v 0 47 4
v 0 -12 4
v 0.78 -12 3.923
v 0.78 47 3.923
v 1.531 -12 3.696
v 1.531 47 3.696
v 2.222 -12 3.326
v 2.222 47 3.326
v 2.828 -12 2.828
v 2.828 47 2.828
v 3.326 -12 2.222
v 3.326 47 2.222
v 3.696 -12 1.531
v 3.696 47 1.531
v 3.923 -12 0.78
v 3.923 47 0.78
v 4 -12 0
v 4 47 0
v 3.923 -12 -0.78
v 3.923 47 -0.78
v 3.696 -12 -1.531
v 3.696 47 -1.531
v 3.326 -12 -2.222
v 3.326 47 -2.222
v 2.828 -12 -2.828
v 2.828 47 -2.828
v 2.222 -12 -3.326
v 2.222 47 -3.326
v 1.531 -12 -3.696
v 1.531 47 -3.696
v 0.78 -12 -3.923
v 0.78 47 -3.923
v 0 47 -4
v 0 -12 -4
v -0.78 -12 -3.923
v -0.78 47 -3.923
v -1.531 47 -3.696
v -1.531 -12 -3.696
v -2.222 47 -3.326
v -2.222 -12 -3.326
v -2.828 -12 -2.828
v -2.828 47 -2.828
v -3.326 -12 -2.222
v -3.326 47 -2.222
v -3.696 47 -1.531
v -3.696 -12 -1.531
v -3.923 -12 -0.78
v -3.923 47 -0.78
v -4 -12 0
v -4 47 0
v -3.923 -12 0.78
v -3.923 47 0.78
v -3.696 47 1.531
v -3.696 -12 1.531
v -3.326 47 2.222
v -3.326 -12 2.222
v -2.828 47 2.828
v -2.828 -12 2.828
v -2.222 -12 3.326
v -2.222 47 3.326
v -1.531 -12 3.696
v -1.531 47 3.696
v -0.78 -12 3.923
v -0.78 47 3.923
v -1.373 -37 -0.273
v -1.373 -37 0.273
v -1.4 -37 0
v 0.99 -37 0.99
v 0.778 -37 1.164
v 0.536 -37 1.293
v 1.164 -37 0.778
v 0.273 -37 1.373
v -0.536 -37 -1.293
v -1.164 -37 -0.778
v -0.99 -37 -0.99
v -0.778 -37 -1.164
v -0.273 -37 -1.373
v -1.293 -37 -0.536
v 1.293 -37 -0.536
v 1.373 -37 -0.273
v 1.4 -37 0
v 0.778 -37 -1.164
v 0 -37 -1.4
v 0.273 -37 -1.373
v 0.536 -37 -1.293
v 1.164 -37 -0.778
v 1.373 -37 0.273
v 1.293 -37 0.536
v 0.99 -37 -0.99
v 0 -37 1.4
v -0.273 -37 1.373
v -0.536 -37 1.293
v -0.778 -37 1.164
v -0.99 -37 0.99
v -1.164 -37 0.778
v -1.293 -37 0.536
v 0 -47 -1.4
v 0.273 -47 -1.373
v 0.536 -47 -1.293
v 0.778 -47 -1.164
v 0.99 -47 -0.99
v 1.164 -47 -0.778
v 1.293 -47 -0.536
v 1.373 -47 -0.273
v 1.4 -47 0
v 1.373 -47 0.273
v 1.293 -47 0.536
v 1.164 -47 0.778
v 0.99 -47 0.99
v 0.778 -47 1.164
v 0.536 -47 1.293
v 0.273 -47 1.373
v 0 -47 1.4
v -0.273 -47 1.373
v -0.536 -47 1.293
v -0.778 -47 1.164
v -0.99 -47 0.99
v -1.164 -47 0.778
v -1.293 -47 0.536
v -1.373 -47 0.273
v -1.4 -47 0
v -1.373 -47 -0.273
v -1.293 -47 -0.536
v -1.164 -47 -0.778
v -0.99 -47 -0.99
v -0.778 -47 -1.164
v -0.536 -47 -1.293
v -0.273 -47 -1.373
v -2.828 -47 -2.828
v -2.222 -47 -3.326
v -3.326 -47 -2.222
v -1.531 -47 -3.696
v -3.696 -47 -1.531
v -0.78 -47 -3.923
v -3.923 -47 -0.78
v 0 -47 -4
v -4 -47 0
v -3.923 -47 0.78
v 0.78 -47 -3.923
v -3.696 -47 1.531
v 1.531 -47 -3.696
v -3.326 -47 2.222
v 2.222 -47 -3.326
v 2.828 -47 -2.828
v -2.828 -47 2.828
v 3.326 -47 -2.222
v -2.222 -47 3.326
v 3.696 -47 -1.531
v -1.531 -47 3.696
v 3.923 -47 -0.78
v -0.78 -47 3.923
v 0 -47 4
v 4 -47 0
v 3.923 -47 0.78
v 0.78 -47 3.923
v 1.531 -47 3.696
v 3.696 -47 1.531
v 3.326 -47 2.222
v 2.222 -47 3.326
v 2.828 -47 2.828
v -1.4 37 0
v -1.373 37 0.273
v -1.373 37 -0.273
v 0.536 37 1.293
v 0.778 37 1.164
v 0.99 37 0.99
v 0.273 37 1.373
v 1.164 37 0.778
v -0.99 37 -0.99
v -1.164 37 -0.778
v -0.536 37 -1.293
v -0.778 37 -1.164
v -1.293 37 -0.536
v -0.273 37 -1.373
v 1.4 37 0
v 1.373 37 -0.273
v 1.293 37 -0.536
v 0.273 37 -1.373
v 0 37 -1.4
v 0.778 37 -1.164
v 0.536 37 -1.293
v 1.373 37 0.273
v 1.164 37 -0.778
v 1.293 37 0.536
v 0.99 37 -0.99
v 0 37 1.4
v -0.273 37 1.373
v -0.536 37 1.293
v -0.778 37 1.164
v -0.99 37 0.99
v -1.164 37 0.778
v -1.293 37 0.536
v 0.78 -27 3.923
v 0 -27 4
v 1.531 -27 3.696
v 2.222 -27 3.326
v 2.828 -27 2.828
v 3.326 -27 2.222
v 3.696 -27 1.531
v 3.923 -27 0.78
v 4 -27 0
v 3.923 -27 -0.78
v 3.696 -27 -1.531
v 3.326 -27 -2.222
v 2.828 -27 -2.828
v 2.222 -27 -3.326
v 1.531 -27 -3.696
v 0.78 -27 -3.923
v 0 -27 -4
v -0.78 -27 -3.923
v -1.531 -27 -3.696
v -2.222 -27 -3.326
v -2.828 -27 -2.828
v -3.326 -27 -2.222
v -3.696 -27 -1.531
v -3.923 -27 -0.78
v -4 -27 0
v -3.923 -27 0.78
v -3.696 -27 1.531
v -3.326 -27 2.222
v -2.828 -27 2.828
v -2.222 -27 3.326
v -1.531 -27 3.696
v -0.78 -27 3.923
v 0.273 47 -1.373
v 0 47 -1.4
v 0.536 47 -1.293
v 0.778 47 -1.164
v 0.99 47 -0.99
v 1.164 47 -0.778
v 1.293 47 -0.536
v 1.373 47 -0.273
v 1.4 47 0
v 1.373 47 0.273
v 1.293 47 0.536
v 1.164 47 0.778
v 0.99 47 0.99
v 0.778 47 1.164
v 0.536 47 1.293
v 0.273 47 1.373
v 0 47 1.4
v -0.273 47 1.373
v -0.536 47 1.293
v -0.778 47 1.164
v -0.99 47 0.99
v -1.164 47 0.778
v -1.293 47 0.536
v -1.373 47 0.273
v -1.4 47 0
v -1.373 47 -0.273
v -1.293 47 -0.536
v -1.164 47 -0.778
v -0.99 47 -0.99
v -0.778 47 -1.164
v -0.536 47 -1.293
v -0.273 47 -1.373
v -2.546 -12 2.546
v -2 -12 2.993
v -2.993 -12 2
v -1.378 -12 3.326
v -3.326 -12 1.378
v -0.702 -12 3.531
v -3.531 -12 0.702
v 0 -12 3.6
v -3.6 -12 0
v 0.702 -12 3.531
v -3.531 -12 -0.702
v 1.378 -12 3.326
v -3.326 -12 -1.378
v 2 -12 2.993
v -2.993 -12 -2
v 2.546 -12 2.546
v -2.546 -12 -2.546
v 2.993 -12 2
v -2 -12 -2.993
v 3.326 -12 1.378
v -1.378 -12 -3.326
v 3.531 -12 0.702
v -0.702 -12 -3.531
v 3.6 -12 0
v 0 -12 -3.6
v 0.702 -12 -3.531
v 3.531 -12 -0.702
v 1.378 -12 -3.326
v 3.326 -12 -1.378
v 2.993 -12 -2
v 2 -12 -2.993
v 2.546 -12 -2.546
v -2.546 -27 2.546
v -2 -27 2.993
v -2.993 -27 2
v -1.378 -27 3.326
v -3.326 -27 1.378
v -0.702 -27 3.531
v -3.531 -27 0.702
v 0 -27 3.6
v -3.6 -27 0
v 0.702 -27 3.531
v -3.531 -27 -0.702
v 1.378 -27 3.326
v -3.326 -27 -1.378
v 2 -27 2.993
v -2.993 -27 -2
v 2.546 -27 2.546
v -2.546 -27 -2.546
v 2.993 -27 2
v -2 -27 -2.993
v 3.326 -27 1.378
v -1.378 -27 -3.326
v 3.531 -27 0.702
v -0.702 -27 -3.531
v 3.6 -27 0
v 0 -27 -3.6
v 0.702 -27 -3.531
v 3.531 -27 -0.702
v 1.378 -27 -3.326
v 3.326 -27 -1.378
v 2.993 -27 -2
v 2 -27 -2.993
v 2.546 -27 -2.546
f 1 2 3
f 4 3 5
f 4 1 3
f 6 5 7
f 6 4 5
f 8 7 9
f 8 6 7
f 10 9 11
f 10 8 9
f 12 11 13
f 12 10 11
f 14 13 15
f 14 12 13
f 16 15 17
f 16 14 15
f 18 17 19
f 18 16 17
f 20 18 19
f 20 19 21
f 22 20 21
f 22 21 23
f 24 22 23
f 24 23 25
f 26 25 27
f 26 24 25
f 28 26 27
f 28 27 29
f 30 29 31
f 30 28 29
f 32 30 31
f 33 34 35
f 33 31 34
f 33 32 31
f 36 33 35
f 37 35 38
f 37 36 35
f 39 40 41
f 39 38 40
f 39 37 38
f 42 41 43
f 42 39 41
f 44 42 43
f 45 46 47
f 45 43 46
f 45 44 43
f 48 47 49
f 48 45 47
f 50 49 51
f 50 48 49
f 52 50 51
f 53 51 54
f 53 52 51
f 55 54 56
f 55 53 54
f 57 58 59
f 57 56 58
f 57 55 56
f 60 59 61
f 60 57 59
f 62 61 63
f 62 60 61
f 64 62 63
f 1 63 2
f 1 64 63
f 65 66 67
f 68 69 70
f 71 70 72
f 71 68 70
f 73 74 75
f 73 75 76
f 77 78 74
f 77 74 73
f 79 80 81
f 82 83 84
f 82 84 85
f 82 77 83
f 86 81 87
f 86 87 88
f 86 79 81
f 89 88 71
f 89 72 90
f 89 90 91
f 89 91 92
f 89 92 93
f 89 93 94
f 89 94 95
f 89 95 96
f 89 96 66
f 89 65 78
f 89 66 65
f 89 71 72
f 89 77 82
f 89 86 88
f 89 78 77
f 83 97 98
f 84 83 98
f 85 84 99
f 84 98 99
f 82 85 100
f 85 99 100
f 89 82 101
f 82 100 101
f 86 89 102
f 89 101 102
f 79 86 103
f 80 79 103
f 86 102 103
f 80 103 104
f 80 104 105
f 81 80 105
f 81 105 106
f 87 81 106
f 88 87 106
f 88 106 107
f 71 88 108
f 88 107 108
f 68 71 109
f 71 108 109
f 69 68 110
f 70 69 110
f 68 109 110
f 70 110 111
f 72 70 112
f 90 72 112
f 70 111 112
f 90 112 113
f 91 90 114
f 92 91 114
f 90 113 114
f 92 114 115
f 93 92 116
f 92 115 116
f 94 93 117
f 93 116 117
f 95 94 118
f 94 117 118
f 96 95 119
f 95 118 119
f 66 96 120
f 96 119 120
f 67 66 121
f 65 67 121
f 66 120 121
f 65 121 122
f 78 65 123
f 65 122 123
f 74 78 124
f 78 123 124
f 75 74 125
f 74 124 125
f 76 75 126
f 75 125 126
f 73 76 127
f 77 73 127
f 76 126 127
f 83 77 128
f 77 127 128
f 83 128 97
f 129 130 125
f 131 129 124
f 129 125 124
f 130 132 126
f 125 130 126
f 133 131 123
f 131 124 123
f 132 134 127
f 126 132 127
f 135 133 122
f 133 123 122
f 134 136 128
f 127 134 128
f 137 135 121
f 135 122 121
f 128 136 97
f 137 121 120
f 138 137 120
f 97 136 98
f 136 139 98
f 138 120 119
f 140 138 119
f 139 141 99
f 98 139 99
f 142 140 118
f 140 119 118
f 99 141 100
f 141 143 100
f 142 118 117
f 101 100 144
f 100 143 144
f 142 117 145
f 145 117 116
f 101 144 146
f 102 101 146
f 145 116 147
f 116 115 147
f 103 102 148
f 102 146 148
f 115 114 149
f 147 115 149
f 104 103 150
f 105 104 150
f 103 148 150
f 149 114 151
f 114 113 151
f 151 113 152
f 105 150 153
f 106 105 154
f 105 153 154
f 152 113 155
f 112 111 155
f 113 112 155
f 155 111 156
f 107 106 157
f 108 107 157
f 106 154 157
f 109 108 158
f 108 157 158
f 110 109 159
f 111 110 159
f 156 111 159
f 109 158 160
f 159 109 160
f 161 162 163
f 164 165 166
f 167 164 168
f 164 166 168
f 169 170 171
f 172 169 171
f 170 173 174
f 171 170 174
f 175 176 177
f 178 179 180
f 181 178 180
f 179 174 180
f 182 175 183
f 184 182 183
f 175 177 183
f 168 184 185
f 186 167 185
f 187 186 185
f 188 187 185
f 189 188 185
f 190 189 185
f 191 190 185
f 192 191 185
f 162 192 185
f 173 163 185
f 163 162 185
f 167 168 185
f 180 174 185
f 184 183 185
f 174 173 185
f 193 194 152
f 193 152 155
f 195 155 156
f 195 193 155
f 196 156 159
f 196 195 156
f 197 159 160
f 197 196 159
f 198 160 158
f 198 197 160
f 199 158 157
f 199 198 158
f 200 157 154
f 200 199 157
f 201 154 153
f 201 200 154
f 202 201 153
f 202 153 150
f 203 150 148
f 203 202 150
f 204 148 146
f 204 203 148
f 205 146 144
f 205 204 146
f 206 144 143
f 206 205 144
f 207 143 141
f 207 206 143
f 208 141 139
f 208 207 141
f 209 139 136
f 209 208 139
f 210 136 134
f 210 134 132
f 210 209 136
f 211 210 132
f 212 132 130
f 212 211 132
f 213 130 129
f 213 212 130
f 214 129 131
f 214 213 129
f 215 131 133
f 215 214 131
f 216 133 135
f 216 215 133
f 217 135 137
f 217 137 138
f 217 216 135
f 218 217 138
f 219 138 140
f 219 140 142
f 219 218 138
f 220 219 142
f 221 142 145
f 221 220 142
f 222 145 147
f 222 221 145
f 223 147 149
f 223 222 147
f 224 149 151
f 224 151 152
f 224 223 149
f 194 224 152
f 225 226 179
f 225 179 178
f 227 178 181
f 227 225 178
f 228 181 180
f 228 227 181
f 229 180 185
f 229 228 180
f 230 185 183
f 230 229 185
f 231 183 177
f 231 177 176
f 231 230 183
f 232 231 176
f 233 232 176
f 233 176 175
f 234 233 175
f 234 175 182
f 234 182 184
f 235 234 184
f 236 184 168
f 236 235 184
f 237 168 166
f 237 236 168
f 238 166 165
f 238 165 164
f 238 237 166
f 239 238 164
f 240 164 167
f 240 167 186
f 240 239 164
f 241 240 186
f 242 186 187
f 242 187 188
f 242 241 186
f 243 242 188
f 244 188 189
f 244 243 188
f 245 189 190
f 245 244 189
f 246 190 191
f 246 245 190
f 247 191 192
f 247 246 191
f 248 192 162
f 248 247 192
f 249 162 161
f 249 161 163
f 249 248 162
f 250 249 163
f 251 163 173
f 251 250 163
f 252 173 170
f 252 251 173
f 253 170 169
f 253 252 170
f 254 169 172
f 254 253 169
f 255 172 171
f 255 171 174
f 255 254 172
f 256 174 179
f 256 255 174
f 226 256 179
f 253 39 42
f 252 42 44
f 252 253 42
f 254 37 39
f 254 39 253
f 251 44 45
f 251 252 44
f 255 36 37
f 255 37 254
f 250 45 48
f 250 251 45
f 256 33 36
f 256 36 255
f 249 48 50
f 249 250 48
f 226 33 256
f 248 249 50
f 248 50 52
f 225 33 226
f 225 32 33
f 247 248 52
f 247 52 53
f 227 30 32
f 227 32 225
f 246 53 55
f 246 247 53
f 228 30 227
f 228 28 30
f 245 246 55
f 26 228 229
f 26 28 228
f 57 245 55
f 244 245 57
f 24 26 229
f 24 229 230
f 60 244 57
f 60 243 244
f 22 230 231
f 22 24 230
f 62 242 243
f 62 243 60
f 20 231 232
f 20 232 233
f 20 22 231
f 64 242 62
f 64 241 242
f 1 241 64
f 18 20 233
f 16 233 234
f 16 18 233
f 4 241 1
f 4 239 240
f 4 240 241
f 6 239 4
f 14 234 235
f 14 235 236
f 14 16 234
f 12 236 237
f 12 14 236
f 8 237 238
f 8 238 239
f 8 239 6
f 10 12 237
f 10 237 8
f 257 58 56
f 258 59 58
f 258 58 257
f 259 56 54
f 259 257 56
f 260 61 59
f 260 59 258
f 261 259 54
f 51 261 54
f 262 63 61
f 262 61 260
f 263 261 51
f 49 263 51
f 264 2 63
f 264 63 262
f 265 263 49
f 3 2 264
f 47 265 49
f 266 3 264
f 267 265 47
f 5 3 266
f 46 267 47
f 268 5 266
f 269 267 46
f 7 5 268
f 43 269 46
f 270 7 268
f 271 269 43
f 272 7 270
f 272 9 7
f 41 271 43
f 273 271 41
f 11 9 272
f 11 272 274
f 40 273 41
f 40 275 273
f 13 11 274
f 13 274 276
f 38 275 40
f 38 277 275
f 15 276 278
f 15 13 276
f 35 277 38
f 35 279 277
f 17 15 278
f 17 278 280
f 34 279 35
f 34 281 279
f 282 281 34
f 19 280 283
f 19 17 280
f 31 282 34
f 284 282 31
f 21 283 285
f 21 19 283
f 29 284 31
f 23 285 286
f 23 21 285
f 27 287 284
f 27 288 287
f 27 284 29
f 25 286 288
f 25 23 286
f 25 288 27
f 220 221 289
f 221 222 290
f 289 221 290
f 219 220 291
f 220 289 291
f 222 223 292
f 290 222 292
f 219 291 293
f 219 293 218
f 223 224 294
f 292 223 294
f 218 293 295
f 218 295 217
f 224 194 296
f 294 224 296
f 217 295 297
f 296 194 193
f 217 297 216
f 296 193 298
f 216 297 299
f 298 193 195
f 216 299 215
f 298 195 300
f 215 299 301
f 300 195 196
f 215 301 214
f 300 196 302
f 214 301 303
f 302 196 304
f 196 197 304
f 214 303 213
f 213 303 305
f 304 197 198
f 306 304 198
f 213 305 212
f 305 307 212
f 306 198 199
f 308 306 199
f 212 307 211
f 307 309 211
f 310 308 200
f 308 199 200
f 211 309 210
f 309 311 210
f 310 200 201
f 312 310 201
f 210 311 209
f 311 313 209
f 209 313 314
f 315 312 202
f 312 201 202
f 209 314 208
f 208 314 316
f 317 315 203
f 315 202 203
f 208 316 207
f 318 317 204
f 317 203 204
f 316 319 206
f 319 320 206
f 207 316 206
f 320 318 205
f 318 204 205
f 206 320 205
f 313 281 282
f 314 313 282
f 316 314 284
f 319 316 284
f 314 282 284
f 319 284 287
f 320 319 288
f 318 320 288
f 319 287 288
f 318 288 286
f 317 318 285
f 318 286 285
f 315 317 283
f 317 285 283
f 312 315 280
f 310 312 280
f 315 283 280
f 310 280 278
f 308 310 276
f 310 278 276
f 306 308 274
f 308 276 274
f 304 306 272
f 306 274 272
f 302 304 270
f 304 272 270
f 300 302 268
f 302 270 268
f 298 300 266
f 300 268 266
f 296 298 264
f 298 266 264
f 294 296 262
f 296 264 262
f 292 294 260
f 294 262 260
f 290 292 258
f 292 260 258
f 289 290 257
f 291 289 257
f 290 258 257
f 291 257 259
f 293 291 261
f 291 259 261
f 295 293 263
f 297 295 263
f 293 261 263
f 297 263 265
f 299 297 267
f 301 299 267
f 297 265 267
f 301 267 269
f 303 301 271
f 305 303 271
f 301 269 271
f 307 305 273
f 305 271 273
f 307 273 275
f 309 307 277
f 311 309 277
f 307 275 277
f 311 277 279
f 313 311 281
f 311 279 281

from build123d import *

# Parameters (mm, degrees)
SKETCH1_R           = 4
BOSS_EXTRUDE1_DEPTH = 47
SKETCH2_R           = 1.4
CUT_EXTRUDE1_DEPTH  = 10
CUT_EXTRUDE2_START  = -35
SKETCH3_R           = 4
SKETCH3_R_2         = 3.6
CUT_EXTRUDE2_DEPTH  = 15


with BuildPart() as part:
    # Sketch1 → Boss-Extrude1 (new, symmetric)
    with BuildSketch(Plane(origin=(0, 0, 0), x_dir=(1, 0, 0), z_dir=(0, 1, 0))):
        with Locations(Location((0, 0, 0), (0, 0, 270))):
            Circle(SKETCH1_R)
    extrude(amount=BOSS_EXTRUDE1_DEPTH, both=True)

    # Sketch2 → Cut-Extrude1 (cut)
    with BuildSketch(Plane.XZ.offset(47)):
        with Locations(Location((0, 0, 0), (0, 0, 270))):
            Circle(SKETCH2_R)
    cut_extrude1 = extrude(amount=-CUT_EXTRUDE1_DEPTH, mode=Mode.SUBTRACT)

    # Mirror1: Cut-Extrude1 across plane
    add(cut_extrude1.mirror(Plane.ZX), mode=Mode.SUBTRACT)

    # Sketch3 → Cut-Extrude2 (cut)
    with BuildSketch(Plane.XZ.offset(47).offset(CUT_EXTRUDE2_START)):
        with Locations(Location((0, 0, 0), (0, 0, 270))):
            Circle(SKETCH3_R)
        with Locations(Location((0, 0, 0), (0, 0, 270))):
            Circle(SKETCH3_R_2, mode=Mode.SUBTRACT)
    extrude(amount=CUT_EXTRUDE2_DEPTH, mode=Mode.SUBTRACT)


solid = part.part
